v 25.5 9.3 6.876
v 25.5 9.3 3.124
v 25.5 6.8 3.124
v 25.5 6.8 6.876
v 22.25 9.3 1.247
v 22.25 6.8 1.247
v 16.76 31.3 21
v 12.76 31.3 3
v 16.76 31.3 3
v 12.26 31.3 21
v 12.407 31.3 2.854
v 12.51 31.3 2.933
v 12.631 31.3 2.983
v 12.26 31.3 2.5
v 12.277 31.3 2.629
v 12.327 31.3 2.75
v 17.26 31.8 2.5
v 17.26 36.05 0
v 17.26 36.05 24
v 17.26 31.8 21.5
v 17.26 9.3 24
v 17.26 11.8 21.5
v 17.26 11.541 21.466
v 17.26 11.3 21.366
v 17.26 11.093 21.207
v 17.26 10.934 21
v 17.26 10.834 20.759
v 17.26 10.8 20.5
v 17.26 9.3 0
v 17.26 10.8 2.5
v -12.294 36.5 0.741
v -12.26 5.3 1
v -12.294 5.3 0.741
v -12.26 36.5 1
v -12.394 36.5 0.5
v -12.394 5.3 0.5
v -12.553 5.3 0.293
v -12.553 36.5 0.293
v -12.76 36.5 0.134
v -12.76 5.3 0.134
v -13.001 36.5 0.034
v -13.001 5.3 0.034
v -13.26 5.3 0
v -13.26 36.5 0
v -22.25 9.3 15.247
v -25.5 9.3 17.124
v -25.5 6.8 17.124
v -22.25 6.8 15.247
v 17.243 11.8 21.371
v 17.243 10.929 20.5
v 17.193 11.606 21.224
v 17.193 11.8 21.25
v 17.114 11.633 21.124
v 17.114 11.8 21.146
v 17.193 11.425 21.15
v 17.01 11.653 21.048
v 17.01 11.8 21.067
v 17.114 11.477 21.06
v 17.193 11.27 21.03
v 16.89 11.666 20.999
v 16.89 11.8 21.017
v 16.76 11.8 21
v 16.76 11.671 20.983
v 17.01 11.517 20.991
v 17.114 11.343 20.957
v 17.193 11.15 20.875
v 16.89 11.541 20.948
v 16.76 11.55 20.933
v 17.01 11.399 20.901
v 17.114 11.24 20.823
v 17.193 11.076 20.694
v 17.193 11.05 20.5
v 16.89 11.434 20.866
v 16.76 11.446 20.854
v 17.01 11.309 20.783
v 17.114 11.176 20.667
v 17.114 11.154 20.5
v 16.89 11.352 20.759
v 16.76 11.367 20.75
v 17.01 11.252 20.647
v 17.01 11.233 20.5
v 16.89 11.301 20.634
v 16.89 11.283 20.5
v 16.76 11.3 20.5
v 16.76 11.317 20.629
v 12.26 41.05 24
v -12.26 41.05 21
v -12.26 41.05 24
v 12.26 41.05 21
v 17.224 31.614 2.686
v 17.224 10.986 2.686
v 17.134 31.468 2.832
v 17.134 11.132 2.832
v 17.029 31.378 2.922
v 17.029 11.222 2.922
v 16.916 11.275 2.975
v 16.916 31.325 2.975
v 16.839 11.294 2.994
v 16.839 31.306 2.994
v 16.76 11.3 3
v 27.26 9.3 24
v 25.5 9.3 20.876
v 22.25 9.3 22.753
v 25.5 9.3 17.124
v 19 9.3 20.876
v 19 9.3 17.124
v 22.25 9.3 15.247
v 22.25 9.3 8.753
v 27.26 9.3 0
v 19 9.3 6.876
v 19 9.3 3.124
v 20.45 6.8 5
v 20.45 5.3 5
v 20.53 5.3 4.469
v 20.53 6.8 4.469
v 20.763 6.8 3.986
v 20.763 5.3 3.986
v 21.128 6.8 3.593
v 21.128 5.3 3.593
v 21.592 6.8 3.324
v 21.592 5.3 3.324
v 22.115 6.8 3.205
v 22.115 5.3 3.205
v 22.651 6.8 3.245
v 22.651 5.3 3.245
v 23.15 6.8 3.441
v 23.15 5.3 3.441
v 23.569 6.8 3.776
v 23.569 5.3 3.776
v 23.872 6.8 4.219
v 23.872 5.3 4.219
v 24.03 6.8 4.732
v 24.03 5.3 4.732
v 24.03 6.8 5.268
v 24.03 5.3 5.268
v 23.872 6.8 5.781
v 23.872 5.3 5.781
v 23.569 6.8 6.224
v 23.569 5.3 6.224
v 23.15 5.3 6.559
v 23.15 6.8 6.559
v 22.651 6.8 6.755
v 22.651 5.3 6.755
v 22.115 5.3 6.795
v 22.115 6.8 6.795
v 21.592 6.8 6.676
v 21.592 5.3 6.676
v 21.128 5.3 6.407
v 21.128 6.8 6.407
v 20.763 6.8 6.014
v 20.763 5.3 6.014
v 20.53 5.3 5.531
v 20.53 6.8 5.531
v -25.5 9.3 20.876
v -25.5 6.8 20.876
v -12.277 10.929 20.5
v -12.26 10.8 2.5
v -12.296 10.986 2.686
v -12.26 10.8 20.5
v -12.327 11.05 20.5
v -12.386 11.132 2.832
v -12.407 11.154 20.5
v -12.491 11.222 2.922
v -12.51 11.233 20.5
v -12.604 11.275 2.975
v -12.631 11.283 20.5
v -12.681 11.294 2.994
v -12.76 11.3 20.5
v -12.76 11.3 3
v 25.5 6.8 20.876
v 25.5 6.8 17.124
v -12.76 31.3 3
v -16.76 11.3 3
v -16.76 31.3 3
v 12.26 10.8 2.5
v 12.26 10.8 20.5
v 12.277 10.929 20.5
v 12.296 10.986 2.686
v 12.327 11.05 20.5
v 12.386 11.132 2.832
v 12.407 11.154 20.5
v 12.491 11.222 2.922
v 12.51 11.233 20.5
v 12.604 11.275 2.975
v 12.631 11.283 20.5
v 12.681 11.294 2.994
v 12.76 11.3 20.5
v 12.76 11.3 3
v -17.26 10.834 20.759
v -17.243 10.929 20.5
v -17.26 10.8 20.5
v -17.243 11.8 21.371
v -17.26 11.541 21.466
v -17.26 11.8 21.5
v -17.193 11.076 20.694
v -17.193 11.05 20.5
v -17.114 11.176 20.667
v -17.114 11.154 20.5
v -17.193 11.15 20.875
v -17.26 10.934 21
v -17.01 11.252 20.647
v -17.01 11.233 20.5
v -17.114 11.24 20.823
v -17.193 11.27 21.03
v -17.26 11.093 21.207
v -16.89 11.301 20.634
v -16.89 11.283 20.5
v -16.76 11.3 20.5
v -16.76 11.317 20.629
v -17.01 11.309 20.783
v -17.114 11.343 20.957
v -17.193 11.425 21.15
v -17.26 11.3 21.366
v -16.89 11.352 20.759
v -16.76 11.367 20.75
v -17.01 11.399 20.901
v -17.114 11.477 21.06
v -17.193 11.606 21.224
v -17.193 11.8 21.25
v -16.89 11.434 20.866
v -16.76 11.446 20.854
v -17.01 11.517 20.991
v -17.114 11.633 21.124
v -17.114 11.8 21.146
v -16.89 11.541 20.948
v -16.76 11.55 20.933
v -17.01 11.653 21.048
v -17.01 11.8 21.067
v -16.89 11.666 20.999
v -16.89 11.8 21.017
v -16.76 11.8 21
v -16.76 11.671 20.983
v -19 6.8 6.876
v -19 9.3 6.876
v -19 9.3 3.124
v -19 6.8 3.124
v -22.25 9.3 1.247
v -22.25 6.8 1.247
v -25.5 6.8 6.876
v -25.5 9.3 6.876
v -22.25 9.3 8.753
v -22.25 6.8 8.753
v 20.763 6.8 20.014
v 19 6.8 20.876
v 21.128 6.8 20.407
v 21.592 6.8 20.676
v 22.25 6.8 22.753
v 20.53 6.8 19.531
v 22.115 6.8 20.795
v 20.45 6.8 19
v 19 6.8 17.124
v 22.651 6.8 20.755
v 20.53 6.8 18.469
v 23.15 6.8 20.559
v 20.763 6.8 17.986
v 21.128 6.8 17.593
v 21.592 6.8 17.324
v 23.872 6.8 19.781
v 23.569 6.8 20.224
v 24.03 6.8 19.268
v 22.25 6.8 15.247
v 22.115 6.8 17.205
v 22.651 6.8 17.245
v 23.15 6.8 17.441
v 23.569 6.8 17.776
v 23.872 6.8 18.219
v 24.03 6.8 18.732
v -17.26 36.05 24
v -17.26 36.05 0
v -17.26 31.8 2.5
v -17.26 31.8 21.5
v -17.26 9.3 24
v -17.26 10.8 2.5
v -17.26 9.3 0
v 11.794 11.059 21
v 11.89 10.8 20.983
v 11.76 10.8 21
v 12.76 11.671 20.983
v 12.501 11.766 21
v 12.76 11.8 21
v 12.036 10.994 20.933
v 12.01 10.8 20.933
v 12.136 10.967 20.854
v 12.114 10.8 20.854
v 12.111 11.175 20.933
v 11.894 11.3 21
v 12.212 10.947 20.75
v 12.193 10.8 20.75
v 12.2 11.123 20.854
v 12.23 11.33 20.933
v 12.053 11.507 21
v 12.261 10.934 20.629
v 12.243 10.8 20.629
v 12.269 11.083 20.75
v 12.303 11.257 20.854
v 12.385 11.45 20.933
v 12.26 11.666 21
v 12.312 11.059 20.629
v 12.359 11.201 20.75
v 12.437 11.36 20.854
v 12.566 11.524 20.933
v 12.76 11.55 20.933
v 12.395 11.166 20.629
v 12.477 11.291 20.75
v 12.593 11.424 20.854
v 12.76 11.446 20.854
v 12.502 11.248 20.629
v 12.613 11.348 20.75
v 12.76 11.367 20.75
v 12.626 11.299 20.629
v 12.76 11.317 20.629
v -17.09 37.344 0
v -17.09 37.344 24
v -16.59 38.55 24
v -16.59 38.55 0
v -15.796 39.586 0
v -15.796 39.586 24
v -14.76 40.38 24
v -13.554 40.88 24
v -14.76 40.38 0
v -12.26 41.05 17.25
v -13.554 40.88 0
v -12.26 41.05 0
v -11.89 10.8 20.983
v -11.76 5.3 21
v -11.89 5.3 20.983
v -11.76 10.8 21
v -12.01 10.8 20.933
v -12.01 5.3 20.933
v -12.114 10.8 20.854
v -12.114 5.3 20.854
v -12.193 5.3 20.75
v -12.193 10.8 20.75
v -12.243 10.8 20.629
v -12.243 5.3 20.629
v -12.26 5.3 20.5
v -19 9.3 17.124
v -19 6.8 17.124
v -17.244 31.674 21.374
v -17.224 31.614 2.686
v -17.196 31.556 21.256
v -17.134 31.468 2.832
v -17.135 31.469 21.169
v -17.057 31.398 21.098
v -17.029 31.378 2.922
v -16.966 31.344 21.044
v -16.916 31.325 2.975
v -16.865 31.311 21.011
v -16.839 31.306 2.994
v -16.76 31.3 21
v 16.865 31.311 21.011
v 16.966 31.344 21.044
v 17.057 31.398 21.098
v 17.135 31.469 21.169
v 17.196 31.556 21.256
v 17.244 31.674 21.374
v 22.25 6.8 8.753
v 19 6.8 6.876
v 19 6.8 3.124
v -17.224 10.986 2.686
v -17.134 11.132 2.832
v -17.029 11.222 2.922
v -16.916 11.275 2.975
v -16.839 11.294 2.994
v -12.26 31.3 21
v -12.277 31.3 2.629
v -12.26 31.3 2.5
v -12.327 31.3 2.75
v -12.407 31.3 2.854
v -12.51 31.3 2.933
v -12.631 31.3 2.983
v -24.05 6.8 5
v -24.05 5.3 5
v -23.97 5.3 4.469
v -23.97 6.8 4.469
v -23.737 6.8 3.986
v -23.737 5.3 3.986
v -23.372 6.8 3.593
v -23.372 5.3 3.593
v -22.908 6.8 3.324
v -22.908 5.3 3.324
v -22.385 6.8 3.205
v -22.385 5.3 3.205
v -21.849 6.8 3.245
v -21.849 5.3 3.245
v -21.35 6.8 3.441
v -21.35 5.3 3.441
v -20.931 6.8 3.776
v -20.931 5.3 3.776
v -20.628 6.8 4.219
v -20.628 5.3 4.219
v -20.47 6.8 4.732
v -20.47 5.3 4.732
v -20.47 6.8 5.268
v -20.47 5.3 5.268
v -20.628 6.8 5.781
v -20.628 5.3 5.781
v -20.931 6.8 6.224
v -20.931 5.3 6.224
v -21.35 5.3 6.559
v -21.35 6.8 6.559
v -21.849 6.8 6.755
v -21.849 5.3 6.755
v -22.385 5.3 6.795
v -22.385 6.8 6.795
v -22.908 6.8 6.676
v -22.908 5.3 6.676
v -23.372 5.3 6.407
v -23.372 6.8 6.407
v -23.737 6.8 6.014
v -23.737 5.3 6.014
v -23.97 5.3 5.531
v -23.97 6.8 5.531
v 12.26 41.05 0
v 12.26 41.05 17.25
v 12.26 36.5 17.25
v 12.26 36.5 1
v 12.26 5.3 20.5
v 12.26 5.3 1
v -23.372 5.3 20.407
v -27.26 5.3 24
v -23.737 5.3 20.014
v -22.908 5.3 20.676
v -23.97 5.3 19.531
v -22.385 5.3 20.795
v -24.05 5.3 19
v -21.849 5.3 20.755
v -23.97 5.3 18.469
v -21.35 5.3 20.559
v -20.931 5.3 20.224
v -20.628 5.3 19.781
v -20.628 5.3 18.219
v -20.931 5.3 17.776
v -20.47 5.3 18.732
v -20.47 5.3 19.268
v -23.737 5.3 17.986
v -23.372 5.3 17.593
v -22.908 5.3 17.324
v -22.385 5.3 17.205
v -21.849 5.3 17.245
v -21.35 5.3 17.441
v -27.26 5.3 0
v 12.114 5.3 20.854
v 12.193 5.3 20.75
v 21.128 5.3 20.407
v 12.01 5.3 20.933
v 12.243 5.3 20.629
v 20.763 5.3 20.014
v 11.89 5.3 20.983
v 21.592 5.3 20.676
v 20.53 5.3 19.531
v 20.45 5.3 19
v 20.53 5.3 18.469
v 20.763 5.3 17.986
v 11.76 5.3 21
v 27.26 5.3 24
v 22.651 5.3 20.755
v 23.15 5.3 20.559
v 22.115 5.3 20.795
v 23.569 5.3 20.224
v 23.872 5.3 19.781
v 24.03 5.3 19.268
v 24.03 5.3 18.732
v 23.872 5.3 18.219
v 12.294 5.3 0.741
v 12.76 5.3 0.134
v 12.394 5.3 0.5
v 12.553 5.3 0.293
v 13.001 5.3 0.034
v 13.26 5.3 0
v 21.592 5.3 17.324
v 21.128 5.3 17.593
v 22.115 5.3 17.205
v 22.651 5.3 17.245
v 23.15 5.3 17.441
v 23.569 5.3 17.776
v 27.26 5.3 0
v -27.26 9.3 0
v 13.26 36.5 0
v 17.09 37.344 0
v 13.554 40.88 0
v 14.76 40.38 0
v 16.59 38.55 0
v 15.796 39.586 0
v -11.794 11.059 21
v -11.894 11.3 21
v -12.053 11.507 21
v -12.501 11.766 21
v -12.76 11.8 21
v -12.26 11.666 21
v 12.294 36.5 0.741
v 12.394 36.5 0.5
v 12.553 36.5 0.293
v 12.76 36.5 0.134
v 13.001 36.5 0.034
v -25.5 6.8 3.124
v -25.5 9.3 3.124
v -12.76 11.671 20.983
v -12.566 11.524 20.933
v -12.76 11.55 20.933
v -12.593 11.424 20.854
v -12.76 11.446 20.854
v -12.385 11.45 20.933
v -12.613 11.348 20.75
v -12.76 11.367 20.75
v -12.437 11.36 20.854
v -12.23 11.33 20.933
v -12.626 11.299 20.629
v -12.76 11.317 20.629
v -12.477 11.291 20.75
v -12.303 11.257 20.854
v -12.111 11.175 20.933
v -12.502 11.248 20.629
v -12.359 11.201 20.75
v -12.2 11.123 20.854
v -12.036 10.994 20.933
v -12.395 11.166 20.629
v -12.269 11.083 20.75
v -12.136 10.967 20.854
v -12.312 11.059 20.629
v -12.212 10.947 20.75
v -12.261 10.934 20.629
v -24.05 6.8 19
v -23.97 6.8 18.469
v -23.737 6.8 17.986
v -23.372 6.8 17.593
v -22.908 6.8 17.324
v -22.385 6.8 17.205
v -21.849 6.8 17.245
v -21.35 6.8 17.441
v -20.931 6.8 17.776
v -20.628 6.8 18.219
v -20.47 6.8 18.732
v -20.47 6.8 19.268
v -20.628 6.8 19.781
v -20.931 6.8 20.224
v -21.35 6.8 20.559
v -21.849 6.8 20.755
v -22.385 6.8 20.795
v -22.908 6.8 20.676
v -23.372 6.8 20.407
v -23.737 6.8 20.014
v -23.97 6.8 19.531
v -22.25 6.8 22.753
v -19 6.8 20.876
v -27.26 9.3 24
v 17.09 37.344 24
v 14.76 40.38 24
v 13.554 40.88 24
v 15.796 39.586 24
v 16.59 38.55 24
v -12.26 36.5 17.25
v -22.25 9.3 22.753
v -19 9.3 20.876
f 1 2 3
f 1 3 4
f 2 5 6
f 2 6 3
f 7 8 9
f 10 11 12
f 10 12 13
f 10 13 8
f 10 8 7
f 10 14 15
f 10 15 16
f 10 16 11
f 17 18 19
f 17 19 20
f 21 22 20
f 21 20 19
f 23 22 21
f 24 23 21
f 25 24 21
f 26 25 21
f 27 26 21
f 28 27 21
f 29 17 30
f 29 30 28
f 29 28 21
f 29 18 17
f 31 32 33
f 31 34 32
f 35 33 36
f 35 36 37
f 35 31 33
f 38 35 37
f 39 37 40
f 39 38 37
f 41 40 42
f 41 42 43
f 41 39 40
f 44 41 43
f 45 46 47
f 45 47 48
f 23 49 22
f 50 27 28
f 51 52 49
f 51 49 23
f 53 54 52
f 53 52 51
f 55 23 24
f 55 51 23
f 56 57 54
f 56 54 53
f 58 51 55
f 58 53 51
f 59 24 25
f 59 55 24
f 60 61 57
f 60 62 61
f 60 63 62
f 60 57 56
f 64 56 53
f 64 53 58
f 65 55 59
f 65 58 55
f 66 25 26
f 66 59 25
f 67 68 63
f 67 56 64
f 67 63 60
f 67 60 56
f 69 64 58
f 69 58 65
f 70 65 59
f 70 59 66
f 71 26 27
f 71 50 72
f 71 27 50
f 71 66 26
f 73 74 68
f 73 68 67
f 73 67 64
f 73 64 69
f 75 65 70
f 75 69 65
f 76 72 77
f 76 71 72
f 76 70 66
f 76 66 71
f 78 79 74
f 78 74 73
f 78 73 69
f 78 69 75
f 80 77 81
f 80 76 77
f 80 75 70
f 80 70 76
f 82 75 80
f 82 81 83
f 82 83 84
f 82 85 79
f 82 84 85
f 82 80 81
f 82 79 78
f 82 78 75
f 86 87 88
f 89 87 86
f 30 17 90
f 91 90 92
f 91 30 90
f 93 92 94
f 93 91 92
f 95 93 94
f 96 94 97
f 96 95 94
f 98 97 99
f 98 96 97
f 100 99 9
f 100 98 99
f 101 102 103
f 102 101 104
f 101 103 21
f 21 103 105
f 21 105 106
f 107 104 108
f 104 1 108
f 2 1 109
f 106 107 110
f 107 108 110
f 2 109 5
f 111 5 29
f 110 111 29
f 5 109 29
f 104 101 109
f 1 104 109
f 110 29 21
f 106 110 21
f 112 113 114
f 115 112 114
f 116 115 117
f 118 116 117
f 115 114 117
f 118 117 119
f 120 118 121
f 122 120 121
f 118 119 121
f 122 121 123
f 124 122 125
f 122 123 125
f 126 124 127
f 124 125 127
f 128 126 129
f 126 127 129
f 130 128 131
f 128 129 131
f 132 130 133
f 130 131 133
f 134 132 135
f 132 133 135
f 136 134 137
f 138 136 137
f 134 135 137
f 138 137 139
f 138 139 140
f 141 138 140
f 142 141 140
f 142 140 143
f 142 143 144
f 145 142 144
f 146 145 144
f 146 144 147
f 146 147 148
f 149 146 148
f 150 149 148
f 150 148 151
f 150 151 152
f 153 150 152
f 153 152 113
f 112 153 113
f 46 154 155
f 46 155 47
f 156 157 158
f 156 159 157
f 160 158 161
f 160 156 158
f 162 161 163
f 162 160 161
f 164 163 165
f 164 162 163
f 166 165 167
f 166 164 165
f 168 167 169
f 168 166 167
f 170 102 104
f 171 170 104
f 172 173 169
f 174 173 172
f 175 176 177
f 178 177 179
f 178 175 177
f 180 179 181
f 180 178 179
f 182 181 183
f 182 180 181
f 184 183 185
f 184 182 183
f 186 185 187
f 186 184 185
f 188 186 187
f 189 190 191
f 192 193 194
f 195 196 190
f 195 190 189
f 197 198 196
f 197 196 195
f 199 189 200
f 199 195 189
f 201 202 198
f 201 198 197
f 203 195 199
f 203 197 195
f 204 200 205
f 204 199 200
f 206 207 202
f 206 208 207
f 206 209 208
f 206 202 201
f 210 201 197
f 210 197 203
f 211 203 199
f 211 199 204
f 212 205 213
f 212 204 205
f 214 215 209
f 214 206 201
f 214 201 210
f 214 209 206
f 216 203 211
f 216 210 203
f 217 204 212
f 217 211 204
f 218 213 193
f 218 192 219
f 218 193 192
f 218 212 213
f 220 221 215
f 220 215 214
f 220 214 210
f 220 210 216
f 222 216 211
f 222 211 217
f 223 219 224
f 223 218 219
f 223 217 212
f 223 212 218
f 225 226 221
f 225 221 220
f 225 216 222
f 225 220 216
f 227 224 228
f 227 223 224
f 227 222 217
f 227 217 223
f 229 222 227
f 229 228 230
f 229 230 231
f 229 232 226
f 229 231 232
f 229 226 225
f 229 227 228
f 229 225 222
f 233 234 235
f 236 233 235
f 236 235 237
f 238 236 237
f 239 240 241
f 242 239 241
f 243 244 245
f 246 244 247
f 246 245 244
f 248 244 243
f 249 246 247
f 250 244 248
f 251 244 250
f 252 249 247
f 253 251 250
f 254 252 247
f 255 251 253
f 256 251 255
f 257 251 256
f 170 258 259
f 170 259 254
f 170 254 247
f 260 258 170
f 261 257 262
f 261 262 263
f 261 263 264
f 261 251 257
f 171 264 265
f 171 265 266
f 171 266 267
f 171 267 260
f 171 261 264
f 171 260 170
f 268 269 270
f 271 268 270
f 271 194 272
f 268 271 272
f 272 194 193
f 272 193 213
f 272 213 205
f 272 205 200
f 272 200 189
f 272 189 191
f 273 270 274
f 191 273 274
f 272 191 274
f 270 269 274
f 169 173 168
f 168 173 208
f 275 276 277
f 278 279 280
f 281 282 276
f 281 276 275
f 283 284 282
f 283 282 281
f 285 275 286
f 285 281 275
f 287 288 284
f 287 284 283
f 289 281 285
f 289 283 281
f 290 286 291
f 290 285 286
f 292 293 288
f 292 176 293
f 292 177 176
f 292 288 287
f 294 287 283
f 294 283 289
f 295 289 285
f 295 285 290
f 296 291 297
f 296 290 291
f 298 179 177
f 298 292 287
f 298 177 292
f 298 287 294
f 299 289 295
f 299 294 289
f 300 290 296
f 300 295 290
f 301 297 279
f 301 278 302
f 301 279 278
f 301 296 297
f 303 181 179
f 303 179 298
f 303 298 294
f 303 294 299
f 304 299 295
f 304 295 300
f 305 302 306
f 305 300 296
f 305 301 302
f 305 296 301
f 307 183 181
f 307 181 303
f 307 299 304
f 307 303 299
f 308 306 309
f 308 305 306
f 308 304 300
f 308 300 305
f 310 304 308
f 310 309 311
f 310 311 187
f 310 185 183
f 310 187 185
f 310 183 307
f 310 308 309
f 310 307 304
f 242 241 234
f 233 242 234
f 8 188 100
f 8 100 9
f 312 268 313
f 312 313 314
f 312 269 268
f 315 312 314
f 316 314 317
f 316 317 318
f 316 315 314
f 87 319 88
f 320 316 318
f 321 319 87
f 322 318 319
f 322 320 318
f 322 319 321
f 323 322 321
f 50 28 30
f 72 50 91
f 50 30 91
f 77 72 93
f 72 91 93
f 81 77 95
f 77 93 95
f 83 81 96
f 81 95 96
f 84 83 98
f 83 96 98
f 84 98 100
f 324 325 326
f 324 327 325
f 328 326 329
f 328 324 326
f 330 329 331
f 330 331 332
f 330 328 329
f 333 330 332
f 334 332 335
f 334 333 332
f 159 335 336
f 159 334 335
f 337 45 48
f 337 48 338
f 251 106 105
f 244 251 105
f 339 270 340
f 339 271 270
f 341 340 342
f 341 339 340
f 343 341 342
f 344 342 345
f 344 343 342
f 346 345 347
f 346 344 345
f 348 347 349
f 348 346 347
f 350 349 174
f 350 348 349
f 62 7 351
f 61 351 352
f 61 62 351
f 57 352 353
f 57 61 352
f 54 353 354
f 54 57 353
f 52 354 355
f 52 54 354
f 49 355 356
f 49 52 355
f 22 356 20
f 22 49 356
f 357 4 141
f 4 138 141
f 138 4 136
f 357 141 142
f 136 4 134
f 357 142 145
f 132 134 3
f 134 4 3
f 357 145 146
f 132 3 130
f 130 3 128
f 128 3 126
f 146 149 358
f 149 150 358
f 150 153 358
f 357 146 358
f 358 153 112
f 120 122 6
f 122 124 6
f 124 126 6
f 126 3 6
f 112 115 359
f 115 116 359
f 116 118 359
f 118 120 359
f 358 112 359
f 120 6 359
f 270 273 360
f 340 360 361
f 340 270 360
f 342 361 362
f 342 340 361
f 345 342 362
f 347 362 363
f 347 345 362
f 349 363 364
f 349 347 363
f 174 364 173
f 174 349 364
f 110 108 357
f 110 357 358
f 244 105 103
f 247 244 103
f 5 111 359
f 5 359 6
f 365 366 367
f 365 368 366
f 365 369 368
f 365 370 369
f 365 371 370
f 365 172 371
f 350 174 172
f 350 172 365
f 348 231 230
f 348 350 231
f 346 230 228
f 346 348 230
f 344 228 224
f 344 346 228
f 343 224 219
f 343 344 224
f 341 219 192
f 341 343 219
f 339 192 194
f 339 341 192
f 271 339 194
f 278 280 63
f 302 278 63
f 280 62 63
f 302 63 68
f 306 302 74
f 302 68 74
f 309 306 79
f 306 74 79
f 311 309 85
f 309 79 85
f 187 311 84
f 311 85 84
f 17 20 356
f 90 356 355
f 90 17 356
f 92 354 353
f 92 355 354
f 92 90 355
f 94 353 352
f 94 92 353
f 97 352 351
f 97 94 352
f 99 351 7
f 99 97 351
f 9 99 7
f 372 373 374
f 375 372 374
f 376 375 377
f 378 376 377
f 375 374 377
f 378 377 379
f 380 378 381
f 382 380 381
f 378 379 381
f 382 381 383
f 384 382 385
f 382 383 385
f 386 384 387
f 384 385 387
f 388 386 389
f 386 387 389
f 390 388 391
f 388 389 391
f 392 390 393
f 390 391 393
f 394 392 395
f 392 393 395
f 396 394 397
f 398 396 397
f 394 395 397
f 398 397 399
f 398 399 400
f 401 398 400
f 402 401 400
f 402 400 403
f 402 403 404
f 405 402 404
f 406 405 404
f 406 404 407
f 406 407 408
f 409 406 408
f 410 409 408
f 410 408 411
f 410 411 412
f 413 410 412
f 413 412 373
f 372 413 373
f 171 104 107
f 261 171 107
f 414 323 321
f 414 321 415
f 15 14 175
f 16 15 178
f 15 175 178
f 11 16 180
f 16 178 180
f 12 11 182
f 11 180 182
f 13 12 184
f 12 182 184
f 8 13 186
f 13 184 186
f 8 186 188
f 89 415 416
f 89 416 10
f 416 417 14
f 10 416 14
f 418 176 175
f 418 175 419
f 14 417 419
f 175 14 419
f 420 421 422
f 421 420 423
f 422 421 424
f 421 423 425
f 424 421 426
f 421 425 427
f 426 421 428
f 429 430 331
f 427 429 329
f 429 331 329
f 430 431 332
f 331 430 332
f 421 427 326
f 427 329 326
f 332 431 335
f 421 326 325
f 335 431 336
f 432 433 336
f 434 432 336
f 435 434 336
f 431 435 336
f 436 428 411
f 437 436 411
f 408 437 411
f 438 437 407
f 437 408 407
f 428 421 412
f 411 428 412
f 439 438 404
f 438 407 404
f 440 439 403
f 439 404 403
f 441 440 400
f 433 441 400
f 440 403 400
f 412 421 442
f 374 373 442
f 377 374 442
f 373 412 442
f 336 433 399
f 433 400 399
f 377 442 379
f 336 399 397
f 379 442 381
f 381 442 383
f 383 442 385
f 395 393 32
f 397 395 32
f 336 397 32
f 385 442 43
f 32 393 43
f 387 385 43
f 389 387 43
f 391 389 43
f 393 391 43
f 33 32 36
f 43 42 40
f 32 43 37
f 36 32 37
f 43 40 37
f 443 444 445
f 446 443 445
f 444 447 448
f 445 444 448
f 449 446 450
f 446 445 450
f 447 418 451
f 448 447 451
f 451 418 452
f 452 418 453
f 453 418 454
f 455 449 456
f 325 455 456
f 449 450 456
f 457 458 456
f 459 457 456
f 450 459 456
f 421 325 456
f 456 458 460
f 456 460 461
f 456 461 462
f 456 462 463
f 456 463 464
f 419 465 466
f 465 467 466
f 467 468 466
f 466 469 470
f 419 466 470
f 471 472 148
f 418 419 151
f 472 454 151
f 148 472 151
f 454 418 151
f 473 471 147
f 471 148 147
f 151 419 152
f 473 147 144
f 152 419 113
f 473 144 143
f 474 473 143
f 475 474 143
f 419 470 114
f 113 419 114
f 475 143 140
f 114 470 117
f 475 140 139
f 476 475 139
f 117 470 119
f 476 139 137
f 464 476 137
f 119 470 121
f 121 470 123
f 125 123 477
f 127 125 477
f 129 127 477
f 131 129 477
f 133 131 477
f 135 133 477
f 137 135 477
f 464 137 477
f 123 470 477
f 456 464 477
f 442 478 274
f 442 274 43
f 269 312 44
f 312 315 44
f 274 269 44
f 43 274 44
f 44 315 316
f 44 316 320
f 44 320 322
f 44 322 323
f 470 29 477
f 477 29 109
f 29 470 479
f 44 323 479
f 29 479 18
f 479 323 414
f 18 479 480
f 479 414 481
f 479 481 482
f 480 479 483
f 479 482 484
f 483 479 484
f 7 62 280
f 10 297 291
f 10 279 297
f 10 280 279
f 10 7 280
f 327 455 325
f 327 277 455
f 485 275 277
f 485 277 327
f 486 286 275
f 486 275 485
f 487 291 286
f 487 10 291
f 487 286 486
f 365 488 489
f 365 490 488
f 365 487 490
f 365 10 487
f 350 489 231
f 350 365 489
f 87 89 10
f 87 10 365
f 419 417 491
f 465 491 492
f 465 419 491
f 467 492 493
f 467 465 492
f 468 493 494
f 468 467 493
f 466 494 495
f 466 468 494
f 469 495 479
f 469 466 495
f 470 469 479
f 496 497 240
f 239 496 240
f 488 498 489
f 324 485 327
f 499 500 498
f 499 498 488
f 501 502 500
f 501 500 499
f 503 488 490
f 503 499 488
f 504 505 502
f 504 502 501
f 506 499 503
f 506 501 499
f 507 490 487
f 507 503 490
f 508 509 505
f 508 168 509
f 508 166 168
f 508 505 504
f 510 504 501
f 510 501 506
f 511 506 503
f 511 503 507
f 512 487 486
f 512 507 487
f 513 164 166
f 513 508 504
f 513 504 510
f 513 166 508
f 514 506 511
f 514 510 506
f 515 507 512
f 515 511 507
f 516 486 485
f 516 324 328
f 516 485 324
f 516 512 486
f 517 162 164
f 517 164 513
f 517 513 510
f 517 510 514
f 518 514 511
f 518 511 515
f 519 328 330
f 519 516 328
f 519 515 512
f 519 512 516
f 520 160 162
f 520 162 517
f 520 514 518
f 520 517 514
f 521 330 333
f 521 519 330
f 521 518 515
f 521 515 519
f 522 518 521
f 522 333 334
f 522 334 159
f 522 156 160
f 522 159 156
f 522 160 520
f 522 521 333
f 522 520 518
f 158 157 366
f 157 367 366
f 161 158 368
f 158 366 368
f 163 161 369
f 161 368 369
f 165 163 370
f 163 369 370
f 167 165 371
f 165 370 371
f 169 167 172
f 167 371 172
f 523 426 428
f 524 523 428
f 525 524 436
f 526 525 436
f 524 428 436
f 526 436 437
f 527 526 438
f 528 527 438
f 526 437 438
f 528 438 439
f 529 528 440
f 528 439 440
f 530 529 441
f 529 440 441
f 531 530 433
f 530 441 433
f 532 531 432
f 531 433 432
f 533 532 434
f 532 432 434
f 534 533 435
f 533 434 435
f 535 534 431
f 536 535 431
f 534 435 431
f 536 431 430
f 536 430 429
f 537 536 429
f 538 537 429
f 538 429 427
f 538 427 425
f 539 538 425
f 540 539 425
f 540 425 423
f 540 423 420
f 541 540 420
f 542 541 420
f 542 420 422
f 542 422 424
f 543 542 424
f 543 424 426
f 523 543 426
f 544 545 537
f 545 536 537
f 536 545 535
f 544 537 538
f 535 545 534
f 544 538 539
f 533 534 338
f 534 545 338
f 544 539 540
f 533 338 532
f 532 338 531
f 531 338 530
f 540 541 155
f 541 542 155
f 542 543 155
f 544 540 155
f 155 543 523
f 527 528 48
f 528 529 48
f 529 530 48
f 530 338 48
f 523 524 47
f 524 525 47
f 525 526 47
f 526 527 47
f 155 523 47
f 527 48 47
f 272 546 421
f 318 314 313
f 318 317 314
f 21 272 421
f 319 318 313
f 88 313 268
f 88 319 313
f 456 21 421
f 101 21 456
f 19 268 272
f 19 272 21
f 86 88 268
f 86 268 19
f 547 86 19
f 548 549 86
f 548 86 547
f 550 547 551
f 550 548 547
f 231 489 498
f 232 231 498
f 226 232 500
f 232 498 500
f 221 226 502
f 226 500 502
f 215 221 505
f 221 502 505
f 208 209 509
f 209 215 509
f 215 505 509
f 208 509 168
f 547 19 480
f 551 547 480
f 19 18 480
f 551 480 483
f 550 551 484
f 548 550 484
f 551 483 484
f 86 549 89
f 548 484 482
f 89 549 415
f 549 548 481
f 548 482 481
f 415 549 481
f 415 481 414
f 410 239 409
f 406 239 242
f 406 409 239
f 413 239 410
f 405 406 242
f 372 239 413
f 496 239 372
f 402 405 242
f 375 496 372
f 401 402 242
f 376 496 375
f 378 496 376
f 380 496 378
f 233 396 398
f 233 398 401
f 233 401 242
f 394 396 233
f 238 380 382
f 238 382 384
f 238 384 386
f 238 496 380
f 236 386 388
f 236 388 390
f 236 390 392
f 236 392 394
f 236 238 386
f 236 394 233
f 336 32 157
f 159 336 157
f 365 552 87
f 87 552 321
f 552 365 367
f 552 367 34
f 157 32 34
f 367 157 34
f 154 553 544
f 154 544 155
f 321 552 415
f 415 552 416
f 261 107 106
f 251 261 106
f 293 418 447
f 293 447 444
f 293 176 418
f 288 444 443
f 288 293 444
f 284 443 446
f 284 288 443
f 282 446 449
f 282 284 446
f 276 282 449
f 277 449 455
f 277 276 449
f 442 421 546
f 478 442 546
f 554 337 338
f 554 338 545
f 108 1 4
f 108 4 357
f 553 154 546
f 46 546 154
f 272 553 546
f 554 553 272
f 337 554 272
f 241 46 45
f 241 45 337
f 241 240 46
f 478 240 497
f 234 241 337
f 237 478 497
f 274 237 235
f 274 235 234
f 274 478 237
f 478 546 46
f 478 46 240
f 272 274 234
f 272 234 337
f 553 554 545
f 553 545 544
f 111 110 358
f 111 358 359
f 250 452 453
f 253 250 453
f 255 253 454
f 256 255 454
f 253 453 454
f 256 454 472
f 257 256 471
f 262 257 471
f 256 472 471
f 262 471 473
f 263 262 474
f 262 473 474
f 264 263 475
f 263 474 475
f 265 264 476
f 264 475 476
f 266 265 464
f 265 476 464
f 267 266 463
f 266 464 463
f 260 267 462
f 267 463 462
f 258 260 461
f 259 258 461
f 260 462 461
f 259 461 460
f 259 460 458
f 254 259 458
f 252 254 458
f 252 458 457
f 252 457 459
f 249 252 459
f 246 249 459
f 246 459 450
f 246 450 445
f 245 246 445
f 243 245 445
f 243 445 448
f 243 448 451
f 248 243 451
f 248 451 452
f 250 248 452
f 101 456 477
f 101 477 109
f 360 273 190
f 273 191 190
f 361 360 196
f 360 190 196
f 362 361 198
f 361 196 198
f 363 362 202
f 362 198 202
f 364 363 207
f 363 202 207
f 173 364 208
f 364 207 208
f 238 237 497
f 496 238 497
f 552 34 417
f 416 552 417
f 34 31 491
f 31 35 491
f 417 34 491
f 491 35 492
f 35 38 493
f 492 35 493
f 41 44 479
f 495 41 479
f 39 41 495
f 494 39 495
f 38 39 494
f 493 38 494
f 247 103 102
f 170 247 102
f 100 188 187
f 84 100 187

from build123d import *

# Parameters (mm, degrees)
BOSS_EXTRUDE1_DEPTH  = 17.5
BOSS_EXTRUDE2_DEPTH  = 6.5
SKETCH4_W            = 24.52025143
SKETCH4_H            = 31.2
CUT_EXTRUDE1_DEPTH   = 3.5
FILLET1_R            = 5
SKETCH7_W            = 10
SKETCH7_H            = 4
BOSS_EXTRUDE3_DEPTH  = 6.5
FILLET2_R            = 1
SKETCH8_W            = 18
SKETCH8_H            = 20
CUT_EXTRUDE4_DEPTH   = 66.139506352
FILLET3_R            = 0.5
CUT_EXTRUDE7_DEPTH   = 2.5
M3_CLEARANCE_HOLE1_D = 3.6
SKETCH14_W           = 24.52025143
SKETCH14_H           = 3.75
CUT_EXTRUDE8_DEPTH   = 48.880627126


with BuildPart() as part:
    # Sketch1 → Boss-Extrude1 (new body)
    with BuildSketch(Plane.XY):
        Polygon((-27.260125715, 5.300000005), (-12.260125715, 5.300000005), (-12.260125715, 36.500000005), (12.260125715, 36.500000005), (12.260125715, 5.300000005), (27.260125715, 5.300000005), (27.260125715, 9.300000005), (17.260125715, 9.300000005), (17.260125715, 38.858678923), (17.260125715, 41.050000005), (15.150659775, 41.050000005), (12, 41.050000005), (-12, 41.050000005), (-17.260125715, 41.050000005), (-17.260125715, 39.558678923), (-17.260125715, 9.300000005), (-27.260125715, 9.300000005), align=None)
    extrude(amount=BOSS_EXTRUDE1_DEPTH)

    # Sketch2 → Boss-Extrude2 (add)
    with BuildSketch(Plane.XY.offset(17.5)):
        Polygon((-17.260125715, 9.300000005), (-17.260125715, 41.050000005), (17.260125715, 41.050000005), (17.260125715, 5.300000005), (-17.260125715, 5.300000005), align=None)
    extrude(amount=BOSS_EXTRUDE2_DEPTH)

    # Sketch4 → Cut-Extrude1 (cut)
    with BuildSketch(Plane(origin=(0, 0, 17.5), x_dir=(-1, 0, 0), z_dir=(0, 0, -1))):
        with Locations((0, 20.900000005)):
            Rectangle(SKETCH4_W, SKETCH4_H)
    extrude(amount=-CUT_EXTRUDE1_DEPTH, mode=Mode.SUBTRACT)

    # Fillet1
    fillet1_edges = [part.edges().sort_by_distance(p)[0] for p in [
        (-17.260125715, 41.050000005, 12),
        (17.260125715, 41.050000005, 12),
    ]]
    fillet(fillet1_edges, radius=FILLET1_R)

    # Sketch7 → Boss-Extrude3 (add, through all)
    with BuildSketch(Plane.XY.offset(17.5)):
        with Locations((-22.260125715, 7.300000005)):
            Rectangle(SKETCH7_W, SKETCH7_H)
        with Locations((22.260125715, 7.300000005)):
            Rectangle(SKETCH7_W, SKETCH7_H)
    extrude(amount=BOSS_EXTRUDE3_DEPTH)

    # Fillet2
    fillet2_edges = [part.edges().sort_by_distance(p)[0] for p in [
        (12.260125715, 20.900000005, 0),
        (-12.260125715, 20.900000005, 0),
    ]]
    fillet(fillet2_edges, radius=FILLET2_R)

    # Sketch8 → Cut-Extrude4 (cut, through all)
    with BuildSketch(Plane.ZY.offset(17.260125715)):
        with Locations((12, 21.300000005)):
            Rectangle(SKETCH8_W, SKETCH8_H)
    extrude(amount=-CUT_EXTRUDE4_DEPTH, mode=Mode.SUBTRACT)

    # Fillet3
    fillet3_edges = [part.edges().sort_by_distance(p)[0] for p in [
        (12.260125715, 8.300000005, 21),
        (12.260125715, 21.300000005, 3),
        (17.260125715, 21.300000005, 3),
        (-12.260125715, 21.300000005, 3),
        (17.260125715, 21.300000005, 21),
        (17.260125715, 31.300000005, 12),
        (17.260125715, 11.300000005, 12),
        (14.760125715, 11.300000005, 21),
        (12.260125715, 11.300000005, 12),
        (-12.260125715, 11.300000005, 12),
        (-14.760125715, 11.300000005, 21),
        (-17.260125715, 21.300000005, 3),
        (-17.260125715, 11.300000005, 12),
        (-17.260125715, 21.300000005, 21),
        (-17.260125715, 31.300000005, 12),
        (-12.260125715, 8.300000005, 21),
    ]]
    fillet(fillet3_edges, radius=FILLET3_R)

    # Sketch6 → Cut-Extrude7 (cut)
    with BuildSketch(Plane(origin=(0, 9.300000005, 0), x_dir=(1, 0, 0), z_dir=(0, 1, 0))):
        Polygon((22.25, -1.24722325), (25.5, -3.123611625), (25.5, -6.876388375), (22.25, -8.75277675), (19, -6.876388375), (19, -3.123611625), align=None)
        Polygon((22.25, -22.75277675), (25.5, -20.876388375), (25.5, -17.123611625), (22.25, -15.24722325), (19, -17.123611625), (19, -20.876388375), align=None)
        Polygon((-22.25, -8.75277675), (-19, -6.876388375), (-19, -3.123611625), (-22.25, -1.24722325), (-25.5, -3.123611625), (-25.5, -6.876388375), align=None)
        Polygon((-22.25, -15.24722325), (-19, -17.123611625), (-19, -20.876388375), (-22.25, -22.75277675), (-25.5, -20.876388375), (-25.5, -17.123611625), align=None)
    extrude(amount=-CUT_EXTRUDE7_DEPTH, mode=Mode.SUBTRACT)

    # M3 Clearance Hole1 (through all)
    with Locations(Plane(origin=(0, 9.300000005, 0), x_dir=(1, 0, 0), z_dir=(0, 1, 0))):
        with Locations((22.25, -19), (22.25, -5), (-22.25, -5), (-22.25, -19)):
            Hole(M3_CLEARANCE_HOLE1_D / 2)

    # Sketch14 → Cut-Extrude8 (cut, through all)
    with BuildSketch(Plane.XZ.offset(-36.500000005)):
        with Locations((0, 19.125)):
            Rectangle(SKETCH14_W, SKETCH14_H)
    extrude(amount=-CUT_EXTRUDE8_DEPTH, mode=Mode.SUBTRACT)


solid = part.part
